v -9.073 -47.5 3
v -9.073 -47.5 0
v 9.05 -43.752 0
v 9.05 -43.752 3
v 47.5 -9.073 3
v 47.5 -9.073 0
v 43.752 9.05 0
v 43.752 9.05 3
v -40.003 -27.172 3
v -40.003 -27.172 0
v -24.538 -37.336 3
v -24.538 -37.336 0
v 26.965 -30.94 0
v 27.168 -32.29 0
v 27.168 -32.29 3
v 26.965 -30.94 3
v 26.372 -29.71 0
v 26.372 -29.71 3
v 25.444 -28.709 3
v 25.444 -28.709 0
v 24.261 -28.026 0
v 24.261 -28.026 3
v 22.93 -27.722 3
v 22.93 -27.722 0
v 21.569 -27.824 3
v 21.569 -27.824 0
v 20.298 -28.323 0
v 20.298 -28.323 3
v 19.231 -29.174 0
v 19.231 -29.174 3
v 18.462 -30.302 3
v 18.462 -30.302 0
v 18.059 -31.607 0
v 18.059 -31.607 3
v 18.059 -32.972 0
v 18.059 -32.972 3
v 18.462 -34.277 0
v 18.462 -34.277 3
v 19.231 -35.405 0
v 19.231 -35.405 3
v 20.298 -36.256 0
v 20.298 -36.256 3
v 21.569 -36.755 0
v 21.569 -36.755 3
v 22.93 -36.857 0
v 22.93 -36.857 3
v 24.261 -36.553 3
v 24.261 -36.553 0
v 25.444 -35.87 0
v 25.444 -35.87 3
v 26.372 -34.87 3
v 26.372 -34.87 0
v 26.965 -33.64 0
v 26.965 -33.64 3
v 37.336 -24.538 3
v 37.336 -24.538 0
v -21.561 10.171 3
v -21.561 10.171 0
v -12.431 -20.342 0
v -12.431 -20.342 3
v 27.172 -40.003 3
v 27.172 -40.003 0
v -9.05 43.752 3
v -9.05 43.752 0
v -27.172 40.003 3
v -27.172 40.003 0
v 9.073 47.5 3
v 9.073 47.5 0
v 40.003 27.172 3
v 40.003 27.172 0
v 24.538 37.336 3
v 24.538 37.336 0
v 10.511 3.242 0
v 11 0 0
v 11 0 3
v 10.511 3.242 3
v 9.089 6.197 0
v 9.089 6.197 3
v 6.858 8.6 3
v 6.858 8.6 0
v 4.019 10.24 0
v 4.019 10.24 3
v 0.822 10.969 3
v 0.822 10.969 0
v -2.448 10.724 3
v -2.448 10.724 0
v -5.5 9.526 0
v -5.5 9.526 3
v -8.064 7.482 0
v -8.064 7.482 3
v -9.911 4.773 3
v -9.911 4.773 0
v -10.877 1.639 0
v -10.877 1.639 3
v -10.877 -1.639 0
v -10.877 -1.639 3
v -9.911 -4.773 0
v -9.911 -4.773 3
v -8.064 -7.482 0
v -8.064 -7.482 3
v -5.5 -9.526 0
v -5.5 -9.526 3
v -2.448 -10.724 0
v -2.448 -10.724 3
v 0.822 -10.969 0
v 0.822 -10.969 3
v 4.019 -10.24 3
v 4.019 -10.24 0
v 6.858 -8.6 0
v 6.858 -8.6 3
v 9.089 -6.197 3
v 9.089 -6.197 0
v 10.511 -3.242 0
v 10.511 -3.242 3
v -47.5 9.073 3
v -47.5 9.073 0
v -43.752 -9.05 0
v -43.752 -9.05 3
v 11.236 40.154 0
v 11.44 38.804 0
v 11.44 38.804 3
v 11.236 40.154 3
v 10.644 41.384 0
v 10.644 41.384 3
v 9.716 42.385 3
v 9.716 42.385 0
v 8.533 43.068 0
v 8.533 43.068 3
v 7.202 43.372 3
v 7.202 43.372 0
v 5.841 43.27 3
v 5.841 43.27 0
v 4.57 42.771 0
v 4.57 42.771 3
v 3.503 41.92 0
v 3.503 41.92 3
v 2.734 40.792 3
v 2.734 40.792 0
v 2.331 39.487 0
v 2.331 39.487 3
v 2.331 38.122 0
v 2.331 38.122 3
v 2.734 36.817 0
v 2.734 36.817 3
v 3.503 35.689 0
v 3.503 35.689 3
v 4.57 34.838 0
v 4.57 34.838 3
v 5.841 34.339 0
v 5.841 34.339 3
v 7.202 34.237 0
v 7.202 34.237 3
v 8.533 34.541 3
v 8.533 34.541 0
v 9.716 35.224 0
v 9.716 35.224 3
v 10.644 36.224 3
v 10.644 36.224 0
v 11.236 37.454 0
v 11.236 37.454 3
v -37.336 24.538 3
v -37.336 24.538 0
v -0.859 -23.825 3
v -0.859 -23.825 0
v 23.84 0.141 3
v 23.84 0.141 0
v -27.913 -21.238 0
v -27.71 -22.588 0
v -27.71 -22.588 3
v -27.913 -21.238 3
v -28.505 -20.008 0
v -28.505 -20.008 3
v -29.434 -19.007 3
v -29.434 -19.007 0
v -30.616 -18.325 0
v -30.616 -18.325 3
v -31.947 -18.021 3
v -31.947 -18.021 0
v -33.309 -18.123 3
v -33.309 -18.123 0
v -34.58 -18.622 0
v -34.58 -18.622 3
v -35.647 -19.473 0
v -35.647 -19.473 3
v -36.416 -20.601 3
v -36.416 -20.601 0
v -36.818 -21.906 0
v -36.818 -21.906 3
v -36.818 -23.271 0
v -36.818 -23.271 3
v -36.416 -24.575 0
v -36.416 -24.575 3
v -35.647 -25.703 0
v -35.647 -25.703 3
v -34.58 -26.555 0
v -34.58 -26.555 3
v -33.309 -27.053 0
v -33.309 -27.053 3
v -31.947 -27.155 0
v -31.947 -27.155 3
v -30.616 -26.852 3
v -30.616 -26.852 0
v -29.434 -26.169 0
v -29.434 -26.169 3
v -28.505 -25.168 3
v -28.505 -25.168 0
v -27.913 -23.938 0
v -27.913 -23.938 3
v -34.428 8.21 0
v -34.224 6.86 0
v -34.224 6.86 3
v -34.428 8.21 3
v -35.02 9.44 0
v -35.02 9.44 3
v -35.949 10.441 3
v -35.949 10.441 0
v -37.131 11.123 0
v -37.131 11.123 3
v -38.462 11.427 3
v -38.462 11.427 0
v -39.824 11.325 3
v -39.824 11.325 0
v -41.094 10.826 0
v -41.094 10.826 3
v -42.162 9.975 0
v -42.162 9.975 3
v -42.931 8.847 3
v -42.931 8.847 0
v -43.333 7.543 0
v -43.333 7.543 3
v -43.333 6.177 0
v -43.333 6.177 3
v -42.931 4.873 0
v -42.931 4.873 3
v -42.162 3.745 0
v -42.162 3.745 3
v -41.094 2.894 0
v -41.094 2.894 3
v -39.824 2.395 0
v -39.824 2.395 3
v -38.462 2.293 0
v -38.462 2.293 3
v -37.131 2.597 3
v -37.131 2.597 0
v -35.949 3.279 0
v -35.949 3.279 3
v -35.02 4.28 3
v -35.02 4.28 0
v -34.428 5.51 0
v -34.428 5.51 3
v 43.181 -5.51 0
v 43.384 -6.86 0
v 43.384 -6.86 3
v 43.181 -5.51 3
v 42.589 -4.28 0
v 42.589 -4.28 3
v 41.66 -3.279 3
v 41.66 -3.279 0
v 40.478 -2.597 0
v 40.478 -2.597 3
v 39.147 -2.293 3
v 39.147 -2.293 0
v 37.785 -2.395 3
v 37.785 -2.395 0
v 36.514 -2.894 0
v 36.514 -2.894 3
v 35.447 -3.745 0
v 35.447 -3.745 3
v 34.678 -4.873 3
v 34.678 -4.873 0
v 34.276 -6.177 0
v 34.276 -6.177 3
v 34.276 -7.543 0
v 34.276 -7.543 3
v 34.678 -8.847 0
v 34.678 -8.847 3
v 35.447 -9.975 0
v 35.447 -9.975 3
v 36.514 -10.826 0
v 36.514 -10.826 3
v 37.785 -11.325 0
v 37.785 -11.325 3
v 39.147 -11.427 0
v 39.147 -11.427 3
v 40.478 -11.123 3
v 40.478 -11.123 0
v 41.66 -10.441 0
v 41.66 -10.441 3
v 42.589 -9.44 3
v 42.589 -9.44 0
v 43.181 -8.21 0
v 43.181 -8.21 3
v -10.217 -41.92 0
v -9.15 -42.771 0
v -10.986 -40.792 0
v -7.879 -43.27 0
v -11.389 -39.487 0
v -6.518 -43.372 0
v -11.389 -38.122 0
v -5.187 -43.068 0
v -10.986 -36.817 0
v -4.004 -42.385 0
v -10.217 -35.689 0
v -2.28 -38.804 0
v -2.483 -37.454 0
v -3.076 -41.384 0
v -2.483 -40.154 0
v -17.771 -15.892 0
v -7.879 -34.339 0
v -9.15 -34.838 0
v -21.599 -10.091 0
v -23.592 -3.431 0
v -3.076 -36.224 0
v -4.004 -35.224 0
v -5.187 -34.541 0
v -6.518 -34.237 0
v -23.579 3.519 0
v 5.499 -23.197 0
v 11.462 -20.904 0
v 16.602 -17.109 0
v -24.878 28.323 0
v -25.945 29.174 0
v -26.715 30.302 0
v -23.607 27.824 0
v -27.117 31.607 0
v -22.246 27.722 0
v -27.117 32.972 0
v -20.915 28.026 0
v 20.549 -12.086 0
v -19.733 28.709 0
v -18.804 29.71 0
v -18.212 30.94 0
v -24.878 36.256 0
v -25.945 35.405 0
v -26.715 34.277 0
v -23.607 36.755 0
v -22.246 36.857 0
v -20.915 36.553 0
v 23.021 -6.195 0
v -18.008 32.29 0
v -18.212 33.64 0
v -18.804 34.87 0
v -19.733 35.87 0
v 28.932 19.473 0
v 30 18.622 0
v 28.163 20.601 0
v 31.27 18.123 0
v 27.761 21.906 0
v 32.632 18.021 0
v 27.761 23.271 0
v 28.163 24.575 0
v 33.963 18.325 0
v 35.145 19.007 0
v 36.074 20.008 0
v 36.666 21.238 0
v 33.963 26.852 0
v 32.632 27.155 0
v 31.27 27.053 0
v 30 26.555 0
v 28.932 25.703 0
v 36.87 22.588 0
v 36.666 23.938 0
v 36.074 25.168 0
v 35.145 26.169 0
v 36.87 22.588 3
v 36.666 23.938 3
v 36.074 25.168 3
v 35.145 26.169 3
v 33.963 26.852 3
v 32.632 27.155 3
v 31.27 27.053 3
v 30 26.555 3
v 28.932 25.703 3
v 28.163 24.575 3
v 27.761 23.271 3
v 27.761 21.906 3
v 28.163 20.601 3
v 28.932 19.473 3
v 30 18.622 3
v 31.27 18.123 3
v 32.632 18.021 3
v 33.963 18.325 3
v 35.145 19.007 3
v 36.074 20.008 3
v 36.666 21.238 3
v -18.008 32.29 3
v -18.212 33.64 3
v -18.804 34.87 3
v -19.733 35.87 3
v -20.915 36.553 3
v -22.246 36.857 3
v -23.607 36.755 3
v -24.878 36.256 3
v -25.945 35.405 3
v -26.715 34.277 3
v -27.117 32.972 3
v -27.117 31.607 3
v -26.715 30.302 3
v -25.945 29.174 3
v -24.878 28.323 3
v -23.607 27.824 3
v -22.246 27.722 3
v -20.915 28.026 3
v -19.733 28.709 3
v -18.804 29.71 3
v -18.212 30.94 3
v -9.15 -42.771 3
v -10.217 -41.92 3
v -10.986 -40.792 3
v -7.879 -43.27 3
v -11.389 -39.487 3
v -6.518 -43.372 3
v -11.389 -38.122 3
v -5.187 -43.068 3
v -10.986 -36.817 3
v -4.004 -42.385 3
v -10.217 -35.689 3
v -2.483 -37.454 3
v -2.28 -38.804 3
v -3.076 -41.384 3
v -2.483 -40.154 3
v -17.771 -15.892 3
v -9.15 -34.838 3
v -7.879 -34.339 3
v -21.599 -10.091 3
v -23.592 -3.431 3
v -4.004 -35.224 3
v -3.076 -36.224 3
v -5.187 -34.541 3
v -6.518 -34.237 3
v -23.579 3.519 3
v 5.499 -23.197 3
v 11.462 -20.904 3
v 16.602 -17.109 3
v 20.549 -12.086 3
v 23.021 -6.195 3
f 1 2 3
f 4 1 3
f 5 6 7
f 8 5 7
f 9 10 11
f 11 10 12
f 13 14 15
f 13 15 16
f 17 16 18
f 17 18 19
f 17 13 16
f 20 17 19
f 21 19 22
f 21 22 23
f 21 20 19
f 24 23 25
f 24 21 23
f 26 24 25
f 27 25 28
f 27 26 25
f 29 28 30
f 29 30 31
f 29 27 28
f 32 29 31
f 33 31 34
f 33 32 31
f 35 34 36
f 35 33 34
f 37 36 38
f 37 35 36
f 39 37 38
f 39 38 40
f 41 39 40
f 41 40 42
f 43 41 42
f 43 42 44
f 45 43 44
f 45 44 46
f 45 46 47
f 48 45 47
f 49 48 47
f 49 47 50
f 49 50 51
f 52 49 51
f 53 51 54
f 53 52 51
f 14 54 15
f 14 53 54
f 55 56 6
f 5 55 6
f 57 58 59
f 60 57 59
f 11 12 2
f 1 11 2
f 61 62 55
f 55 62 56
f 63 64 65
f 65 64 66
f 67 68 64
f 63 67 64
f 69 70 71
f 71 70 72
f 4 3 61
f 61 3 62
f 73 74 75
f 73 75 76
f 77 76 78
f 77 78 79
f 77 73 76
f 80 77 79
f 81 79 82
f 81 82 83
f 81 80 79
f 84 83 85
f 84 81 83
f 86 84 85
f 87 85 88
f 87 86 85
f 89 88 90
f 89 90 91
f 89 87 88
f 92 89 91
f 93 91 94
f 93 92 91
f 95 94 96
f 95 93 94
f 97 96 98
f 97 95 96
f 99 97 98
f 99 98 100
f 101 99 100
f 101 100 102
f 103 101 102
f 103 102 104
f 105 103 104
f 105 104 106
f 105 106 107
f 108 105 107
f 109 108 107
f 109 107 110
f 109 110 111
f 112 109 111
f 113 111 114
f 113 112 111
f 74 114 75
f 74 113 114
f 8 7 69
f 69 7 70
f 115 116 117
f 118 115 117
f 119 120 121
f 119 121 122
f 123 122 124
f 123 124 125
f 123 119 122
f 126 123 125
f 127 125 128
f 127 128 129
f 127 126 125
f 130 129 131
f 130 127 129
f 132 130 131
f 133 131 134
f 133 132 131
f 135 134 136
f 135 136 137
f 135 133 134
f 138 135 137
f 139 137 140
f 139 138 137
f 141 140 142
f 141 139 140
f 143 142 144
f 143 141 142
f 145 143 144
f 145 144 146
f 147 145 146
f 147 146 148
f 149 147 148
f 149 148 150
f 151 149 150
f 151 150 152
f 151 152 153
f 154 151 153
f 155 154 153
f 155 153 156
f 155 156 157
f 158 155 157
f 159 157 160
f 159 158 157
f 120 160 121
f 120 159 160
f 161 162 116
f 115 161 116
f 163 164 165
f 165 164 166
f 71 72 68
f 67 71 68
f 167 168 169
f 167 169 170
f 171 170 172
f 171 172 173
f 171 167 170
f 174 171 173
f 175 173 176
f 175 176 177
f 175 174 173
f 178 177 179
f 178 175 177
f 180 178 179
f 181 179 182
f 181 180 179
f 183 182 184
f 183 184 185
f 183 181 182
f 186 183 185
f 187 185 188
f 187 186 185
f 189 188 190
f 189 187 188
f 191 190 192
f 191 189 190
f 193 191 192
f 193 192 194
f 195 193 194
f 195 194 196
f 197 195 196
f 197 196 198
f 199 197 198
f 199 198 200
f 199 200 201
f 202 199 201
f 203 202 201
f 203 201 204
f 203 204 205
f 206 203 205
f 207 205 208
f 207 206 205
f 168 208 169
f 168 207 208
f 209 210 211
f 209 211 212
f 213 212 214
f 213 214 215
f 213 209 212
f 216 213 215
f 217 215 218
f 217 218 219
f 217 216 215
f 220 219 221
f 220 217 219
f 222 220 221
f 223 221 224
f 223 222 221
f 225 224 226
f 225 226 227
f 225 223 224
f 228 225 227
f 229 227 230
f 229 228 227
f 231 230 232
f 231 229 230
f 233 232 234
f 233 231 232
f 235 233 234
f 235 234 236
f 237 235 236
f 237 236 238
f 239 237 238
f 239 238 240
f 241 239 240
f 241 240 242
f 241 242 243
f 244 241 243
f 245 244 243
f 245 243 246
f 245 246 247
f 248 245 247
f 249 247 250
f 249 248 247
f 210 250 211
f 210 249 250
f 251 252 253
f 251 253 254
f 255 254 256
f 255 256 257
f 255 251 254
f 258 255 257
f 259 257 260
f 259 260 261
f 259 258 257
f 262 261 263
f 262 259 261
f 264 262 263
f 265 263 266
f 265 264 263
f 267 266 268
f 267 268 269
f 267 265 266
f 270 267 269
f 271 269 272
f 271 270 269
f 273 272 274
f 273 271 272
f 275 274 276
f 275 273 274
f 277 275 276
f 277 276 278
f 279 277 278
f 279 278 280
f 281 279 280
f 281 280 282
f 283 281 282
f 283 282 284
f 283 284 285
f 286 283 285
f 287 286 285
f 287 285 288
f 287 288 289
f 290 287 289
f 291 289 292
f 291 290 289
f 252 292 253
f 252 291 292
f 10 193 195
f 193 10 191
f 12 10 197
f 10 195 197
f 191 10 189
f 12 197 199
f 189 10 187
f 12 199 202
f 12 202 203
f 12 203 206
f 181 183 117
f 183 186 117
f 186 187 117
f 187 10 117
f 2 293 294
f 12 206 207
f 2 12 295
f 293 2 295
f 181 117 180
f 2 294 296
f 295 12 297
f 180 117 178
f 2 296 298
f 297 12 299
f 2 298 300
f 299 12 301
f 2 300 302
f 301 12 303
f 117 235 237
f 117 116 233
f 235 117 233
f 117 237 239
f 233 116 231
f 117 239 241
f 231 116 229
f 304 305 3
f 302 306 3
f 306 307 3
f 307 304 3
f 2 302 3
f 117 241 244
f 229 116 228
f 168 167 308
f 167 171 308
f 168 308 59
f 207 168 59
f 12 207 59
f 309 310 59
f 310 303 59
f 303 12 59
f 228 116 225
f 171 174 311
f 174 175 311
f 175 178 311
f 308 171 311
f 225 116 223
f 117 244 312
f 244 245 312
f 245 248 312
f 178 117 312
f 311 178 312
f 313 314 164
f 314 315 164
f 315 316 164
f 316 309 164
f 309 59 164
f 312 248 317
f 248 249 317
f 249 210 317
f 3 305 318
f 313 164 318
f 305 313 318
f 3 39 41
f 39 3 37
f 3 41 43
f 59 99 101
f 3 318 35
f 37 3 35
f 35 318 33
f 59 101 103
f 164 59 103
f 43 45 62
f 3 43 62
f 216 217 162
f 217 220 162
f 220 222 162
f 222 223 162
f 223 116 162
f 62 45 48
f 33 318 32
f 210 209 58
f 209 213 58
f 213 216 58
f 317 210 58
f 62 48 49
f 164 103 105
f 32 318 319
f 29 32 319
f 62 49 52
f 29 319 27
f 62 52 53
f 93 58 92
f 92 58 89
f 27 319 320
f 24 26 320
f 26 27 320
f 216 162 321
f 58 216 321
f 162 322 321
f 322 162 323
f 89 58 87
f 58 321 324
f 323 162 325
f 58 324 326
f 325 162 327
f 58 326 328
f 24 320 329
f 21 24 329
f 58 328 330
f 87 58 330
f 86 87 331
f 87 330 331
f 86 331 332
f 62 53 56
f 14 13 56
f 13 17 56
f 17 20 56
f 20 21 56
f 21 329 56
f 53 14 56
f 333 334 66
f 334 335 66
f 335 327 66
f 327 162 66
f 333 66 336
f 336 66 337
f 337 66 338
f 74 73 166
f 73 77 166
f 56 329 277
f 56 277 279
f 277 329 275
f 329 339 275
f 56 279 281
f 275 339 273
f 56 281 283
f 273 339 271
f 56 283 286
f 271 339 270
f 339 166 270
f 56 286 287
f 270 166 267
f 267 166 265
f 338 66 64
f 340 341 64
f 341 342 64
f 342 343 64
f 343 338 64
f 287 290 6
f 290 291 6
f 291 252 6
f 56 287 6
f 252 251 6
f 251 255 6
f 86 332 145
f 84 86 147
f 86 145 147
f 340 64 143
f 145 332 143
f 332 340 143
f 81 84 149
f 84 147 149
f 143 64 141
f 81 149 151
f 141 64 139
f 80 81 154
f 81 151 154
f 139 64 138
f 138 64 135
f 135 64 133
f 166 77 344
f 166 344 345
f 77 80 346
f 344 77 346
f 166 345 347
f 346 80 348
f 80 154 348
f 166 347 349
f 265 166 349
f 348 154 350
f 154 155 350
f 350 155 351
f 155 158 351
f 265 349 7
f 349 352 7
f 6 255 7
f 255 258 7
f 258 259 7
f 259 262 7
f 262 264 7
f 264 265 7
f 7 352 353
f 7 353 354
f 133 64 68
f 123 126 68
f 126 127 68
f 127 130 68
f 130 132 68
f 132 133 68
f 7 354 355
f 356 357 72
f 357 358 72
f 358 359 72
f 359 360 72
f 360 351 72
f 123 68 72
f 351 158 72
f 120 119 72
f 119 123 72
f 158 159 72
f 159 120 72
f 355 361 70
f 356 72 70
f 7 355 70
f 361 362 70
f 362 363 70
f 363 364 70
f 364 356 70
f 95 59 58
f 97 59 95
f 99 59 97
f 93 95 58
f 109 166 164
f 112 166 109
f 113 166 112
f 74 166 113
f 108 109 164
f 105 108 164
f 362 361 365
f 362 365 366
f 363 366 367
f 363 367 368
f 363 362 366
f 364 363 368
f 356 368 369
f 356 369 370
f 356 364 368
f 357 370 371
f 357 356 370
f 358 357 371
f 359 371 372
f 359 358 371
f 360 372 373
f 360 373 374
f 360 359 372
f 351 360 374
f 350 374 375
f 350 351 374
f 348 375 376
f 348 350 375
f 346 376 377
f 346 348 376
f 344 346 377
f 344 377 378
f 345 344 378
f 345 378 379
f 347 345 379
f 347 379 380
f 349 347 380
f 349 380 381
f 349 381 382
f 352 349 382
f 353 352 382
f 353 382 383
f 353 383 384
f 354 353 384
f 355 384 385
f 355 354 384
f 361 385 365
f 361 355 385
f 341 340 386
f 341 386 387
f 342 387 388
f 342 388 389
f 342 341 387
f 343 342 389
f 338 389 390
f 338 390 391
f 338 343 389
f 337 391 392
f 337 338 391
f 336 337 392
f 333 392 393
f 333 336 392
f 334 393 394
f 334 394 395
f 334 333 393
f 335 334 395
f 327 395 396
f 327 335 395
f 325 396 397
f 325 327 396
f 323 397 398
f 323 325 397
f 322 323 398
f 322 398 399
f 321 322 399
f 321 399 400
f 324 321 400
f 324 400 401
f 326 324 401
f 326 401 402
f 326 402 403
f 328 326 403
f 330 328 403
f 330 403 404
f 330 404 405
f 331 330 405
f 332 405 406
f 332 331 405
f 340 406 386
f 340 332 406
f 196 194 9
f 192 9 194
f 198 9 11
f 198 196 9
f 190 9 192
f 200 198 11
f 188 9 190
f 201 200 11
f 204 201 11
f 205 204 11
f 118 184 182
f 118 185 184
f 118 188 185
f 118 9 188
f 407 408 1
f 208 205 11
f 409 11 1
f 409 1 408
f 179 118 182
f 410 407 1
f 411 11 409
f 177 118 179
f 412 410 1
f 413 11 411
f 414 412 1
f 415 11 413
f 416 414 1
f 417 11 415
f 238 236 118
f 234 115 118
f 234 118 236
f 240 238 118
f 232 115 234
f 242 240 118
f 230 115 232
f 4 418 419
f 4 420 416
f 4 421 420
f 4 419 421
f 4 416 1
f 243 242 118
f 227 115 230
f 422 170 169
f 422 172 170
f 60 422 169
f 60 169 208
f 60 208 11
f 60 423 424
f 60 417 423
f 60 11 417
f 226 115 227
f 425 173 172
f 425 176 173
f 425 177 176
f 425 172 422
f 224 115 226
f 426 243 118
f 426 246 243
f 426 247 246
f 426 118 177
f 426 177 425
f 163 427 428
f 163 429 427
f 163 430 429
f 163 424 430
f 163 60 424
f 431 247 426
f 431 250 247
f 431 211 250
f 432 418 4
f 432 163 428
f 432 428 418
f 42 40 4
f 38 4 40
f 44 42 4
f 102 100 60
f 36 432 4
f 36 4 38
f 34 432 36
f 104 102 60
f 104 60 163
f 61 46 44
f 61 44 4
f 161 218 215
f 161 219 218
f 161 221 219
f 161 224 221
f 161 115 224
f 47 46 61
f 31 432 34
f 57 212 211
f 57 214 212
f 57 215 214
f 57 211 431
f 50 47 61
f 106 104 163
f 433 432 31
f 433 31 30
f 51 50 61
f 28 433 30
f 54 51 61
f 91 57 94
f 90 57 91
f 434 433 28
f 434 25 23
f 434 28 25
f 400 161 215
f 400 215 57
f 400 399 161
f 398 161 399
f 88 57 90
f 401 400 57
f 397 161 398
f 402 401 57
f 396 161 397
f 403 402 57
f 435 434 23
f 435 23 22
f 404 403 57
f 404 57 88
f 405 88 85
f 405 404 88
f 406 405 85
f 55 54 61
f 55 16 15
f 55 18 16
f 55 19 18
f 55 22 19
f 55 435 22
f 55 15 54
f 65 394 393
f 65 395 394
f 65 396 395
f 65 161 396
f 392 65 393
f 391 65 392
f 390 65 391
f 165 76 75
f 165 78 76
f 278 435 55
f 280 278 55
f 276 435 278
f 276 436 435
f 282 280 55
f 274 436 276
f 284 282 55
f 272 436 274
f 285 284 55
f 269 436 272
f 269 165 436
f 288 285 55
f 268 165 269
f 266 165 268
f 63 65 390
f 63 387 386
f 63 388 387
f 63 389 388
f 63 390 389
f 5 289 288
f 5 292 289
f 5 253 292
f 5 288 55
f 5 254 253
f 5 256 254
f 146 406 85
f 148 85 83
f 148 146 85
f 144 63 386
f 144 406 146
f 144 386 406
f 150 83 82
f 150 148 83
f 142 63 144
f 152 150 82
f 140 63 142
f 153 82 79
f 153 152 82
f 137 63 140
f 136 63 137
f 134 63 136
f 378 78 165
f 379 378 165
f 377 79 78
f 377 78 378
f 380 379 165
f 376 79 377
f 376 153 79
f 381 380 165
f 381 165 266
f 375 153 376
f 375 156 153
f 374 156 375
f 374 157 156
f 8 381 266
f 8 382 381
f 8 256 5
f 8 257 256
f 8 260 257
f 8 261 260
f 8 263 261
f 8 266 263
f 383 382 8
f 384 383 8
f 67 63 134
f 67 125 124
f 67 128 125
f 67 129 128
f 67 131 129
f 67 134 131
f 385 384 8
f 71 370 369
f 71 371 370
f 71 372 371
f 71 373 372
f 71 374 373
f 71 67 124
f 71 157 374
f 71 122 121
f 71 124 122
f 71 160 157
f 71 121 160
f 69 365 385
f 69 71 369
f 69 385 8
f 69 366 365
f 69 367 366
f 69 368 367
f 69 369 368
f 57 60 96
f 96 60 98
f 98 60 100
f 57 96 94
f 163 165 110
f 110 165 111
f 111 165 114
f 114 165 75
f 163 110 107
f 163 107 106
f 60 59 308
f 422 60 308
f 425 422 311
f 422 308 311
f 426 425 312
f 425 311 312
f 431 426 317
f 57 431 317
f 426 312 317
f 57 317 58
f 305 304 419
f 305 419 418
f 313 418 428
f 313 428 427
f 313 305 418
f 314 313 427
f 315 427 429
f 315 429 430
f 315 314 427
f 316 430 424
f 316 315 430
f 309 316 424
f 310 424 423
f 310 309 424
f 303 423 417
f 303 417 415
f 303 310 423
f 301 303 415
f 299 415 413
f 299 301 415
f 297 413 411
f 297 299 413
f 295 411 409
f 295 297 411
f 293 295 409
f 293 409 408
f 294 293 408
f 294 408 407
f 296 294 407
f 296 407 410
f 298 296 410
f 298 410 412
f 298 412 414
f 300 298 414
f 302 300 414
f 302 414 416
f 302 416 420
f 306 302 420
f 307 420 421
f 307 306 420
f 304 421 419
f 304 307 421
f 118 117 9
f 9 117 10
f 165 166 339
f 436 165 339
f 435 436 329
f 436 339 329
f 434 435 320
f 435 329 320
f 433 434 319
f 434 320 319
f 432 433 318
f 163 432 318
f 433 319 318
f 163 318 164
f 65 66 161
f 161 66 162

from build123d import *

# Parameters (mm, degrees)
F1_R     = 4.58
F1_R_2   = 11
F2_DEPTH = 3


# Not quite as in the source:
# - a feature names something its author has since deleted; it is built from what else it names


with BuildPart() as f2:
    # F1 (on face) → F2 (new body)
    with BuildSketch(Plane.XY):
        Polygon((24.5380218439, 37.3360185584), (9.072936592, 47.5), (-9.0495502624, 43.7515535479), (-27.1720371169, 40.0031070959), (-37.3360185584, 24.5380218439), (-47.5, 9.072936592), (-43.7515535479, -9.0495502624), (-40.0031070959, -27.1720371169), (-24.5380218439, -37.3360185584), (-9.072936592, -47.5), (9.0495502624, -43.7515535479), (27.1720371169, -40.0031070959), (37.3360185584, -24.5380218439), (47.5, -9.072936592), (43.7515535479, 9.0495502624), (40.0031070959, 27.1720371169), align=None)
        with Locations((-6.8599609456, -38.8043858107)):
            Circle(F1_R, mode=Mode.SUBTRACT)
        with Locations((-32.2895692498, -22.5881194432)):
            Circle(F1_R, mode=Mode.SUBTRACT)
        with BuildLine():
            ThreePointArc((-12.4312179995, -20.3423307182), (-22.8394812689, -6.8340101965), (-21.5614159426, 10.1710836469))
            Line((-21.5614159426, 10.1710836469), (-12.4312179995, -20.3423307182))
        make_face(mode=Mode.SUBTRACT)
        with Locations((22.5881194432, -32.2895692498)):
            Circle(F1_R, mode=Mode.SUBTRACT)
        with BuildLine():
            Line((-0.8588934675, -23.8245231224), (23.8395803729, 0.1414483779))
            ThreePointArc((23.8395803729, 0.1414483779), (16.601805328, -17.1092273306), (-0.8588934675, -23.8245231224))
        make_face(mode=Mode.SUBTRACT)
        with Locations((38.8043858107, -6.8599609456)):
            Circle(F1_R, mode=Mode.SUBTRACT)
        with Locations((-38.8043858107, 6.8599609456)):
            Circle(F1_R, mode=Mode.SUBTRACT)
        with Locations((-22.5881194432, 32.2895692498)):
            Circle(F1_R, mode=Mode.SUBTRACT)
        Circle(F1_R_2, mode=Mode.SUBTRACT)
        with BuildLine():
            ThreePointArc((-14.3344307522, 19.0491389572), (5.5013141945, 23.1965760864), (21.3620855471, 10.5833312845))
            Line((21.3620855471, 10.5833312845), (-14.3344307522, 19.0491389572))
        make_face(mode=Mode.SUBTRACT)
        with Locations((32.2895692498, 22.5881194432)):
            Circle(F1_R, mode=Mode.SUBTRACT)
        with Locations((6.8599609456, 38.8043858107)):
            Circle(F1_R, mode=Mode.SUBTRACT)
        with BuildLine():
            Line((-14.3344307522, 19.0491389572), (21.3620855471, 10.5833312845))
            ThreePointArc((21.3620855471, 10.5833312845), (5.5013141945, 23.1965760864), (-14.3344307522, 19.0491389572))
        make_face()
    extrude(amount=F2_DEPTH)


solid = f2.part
